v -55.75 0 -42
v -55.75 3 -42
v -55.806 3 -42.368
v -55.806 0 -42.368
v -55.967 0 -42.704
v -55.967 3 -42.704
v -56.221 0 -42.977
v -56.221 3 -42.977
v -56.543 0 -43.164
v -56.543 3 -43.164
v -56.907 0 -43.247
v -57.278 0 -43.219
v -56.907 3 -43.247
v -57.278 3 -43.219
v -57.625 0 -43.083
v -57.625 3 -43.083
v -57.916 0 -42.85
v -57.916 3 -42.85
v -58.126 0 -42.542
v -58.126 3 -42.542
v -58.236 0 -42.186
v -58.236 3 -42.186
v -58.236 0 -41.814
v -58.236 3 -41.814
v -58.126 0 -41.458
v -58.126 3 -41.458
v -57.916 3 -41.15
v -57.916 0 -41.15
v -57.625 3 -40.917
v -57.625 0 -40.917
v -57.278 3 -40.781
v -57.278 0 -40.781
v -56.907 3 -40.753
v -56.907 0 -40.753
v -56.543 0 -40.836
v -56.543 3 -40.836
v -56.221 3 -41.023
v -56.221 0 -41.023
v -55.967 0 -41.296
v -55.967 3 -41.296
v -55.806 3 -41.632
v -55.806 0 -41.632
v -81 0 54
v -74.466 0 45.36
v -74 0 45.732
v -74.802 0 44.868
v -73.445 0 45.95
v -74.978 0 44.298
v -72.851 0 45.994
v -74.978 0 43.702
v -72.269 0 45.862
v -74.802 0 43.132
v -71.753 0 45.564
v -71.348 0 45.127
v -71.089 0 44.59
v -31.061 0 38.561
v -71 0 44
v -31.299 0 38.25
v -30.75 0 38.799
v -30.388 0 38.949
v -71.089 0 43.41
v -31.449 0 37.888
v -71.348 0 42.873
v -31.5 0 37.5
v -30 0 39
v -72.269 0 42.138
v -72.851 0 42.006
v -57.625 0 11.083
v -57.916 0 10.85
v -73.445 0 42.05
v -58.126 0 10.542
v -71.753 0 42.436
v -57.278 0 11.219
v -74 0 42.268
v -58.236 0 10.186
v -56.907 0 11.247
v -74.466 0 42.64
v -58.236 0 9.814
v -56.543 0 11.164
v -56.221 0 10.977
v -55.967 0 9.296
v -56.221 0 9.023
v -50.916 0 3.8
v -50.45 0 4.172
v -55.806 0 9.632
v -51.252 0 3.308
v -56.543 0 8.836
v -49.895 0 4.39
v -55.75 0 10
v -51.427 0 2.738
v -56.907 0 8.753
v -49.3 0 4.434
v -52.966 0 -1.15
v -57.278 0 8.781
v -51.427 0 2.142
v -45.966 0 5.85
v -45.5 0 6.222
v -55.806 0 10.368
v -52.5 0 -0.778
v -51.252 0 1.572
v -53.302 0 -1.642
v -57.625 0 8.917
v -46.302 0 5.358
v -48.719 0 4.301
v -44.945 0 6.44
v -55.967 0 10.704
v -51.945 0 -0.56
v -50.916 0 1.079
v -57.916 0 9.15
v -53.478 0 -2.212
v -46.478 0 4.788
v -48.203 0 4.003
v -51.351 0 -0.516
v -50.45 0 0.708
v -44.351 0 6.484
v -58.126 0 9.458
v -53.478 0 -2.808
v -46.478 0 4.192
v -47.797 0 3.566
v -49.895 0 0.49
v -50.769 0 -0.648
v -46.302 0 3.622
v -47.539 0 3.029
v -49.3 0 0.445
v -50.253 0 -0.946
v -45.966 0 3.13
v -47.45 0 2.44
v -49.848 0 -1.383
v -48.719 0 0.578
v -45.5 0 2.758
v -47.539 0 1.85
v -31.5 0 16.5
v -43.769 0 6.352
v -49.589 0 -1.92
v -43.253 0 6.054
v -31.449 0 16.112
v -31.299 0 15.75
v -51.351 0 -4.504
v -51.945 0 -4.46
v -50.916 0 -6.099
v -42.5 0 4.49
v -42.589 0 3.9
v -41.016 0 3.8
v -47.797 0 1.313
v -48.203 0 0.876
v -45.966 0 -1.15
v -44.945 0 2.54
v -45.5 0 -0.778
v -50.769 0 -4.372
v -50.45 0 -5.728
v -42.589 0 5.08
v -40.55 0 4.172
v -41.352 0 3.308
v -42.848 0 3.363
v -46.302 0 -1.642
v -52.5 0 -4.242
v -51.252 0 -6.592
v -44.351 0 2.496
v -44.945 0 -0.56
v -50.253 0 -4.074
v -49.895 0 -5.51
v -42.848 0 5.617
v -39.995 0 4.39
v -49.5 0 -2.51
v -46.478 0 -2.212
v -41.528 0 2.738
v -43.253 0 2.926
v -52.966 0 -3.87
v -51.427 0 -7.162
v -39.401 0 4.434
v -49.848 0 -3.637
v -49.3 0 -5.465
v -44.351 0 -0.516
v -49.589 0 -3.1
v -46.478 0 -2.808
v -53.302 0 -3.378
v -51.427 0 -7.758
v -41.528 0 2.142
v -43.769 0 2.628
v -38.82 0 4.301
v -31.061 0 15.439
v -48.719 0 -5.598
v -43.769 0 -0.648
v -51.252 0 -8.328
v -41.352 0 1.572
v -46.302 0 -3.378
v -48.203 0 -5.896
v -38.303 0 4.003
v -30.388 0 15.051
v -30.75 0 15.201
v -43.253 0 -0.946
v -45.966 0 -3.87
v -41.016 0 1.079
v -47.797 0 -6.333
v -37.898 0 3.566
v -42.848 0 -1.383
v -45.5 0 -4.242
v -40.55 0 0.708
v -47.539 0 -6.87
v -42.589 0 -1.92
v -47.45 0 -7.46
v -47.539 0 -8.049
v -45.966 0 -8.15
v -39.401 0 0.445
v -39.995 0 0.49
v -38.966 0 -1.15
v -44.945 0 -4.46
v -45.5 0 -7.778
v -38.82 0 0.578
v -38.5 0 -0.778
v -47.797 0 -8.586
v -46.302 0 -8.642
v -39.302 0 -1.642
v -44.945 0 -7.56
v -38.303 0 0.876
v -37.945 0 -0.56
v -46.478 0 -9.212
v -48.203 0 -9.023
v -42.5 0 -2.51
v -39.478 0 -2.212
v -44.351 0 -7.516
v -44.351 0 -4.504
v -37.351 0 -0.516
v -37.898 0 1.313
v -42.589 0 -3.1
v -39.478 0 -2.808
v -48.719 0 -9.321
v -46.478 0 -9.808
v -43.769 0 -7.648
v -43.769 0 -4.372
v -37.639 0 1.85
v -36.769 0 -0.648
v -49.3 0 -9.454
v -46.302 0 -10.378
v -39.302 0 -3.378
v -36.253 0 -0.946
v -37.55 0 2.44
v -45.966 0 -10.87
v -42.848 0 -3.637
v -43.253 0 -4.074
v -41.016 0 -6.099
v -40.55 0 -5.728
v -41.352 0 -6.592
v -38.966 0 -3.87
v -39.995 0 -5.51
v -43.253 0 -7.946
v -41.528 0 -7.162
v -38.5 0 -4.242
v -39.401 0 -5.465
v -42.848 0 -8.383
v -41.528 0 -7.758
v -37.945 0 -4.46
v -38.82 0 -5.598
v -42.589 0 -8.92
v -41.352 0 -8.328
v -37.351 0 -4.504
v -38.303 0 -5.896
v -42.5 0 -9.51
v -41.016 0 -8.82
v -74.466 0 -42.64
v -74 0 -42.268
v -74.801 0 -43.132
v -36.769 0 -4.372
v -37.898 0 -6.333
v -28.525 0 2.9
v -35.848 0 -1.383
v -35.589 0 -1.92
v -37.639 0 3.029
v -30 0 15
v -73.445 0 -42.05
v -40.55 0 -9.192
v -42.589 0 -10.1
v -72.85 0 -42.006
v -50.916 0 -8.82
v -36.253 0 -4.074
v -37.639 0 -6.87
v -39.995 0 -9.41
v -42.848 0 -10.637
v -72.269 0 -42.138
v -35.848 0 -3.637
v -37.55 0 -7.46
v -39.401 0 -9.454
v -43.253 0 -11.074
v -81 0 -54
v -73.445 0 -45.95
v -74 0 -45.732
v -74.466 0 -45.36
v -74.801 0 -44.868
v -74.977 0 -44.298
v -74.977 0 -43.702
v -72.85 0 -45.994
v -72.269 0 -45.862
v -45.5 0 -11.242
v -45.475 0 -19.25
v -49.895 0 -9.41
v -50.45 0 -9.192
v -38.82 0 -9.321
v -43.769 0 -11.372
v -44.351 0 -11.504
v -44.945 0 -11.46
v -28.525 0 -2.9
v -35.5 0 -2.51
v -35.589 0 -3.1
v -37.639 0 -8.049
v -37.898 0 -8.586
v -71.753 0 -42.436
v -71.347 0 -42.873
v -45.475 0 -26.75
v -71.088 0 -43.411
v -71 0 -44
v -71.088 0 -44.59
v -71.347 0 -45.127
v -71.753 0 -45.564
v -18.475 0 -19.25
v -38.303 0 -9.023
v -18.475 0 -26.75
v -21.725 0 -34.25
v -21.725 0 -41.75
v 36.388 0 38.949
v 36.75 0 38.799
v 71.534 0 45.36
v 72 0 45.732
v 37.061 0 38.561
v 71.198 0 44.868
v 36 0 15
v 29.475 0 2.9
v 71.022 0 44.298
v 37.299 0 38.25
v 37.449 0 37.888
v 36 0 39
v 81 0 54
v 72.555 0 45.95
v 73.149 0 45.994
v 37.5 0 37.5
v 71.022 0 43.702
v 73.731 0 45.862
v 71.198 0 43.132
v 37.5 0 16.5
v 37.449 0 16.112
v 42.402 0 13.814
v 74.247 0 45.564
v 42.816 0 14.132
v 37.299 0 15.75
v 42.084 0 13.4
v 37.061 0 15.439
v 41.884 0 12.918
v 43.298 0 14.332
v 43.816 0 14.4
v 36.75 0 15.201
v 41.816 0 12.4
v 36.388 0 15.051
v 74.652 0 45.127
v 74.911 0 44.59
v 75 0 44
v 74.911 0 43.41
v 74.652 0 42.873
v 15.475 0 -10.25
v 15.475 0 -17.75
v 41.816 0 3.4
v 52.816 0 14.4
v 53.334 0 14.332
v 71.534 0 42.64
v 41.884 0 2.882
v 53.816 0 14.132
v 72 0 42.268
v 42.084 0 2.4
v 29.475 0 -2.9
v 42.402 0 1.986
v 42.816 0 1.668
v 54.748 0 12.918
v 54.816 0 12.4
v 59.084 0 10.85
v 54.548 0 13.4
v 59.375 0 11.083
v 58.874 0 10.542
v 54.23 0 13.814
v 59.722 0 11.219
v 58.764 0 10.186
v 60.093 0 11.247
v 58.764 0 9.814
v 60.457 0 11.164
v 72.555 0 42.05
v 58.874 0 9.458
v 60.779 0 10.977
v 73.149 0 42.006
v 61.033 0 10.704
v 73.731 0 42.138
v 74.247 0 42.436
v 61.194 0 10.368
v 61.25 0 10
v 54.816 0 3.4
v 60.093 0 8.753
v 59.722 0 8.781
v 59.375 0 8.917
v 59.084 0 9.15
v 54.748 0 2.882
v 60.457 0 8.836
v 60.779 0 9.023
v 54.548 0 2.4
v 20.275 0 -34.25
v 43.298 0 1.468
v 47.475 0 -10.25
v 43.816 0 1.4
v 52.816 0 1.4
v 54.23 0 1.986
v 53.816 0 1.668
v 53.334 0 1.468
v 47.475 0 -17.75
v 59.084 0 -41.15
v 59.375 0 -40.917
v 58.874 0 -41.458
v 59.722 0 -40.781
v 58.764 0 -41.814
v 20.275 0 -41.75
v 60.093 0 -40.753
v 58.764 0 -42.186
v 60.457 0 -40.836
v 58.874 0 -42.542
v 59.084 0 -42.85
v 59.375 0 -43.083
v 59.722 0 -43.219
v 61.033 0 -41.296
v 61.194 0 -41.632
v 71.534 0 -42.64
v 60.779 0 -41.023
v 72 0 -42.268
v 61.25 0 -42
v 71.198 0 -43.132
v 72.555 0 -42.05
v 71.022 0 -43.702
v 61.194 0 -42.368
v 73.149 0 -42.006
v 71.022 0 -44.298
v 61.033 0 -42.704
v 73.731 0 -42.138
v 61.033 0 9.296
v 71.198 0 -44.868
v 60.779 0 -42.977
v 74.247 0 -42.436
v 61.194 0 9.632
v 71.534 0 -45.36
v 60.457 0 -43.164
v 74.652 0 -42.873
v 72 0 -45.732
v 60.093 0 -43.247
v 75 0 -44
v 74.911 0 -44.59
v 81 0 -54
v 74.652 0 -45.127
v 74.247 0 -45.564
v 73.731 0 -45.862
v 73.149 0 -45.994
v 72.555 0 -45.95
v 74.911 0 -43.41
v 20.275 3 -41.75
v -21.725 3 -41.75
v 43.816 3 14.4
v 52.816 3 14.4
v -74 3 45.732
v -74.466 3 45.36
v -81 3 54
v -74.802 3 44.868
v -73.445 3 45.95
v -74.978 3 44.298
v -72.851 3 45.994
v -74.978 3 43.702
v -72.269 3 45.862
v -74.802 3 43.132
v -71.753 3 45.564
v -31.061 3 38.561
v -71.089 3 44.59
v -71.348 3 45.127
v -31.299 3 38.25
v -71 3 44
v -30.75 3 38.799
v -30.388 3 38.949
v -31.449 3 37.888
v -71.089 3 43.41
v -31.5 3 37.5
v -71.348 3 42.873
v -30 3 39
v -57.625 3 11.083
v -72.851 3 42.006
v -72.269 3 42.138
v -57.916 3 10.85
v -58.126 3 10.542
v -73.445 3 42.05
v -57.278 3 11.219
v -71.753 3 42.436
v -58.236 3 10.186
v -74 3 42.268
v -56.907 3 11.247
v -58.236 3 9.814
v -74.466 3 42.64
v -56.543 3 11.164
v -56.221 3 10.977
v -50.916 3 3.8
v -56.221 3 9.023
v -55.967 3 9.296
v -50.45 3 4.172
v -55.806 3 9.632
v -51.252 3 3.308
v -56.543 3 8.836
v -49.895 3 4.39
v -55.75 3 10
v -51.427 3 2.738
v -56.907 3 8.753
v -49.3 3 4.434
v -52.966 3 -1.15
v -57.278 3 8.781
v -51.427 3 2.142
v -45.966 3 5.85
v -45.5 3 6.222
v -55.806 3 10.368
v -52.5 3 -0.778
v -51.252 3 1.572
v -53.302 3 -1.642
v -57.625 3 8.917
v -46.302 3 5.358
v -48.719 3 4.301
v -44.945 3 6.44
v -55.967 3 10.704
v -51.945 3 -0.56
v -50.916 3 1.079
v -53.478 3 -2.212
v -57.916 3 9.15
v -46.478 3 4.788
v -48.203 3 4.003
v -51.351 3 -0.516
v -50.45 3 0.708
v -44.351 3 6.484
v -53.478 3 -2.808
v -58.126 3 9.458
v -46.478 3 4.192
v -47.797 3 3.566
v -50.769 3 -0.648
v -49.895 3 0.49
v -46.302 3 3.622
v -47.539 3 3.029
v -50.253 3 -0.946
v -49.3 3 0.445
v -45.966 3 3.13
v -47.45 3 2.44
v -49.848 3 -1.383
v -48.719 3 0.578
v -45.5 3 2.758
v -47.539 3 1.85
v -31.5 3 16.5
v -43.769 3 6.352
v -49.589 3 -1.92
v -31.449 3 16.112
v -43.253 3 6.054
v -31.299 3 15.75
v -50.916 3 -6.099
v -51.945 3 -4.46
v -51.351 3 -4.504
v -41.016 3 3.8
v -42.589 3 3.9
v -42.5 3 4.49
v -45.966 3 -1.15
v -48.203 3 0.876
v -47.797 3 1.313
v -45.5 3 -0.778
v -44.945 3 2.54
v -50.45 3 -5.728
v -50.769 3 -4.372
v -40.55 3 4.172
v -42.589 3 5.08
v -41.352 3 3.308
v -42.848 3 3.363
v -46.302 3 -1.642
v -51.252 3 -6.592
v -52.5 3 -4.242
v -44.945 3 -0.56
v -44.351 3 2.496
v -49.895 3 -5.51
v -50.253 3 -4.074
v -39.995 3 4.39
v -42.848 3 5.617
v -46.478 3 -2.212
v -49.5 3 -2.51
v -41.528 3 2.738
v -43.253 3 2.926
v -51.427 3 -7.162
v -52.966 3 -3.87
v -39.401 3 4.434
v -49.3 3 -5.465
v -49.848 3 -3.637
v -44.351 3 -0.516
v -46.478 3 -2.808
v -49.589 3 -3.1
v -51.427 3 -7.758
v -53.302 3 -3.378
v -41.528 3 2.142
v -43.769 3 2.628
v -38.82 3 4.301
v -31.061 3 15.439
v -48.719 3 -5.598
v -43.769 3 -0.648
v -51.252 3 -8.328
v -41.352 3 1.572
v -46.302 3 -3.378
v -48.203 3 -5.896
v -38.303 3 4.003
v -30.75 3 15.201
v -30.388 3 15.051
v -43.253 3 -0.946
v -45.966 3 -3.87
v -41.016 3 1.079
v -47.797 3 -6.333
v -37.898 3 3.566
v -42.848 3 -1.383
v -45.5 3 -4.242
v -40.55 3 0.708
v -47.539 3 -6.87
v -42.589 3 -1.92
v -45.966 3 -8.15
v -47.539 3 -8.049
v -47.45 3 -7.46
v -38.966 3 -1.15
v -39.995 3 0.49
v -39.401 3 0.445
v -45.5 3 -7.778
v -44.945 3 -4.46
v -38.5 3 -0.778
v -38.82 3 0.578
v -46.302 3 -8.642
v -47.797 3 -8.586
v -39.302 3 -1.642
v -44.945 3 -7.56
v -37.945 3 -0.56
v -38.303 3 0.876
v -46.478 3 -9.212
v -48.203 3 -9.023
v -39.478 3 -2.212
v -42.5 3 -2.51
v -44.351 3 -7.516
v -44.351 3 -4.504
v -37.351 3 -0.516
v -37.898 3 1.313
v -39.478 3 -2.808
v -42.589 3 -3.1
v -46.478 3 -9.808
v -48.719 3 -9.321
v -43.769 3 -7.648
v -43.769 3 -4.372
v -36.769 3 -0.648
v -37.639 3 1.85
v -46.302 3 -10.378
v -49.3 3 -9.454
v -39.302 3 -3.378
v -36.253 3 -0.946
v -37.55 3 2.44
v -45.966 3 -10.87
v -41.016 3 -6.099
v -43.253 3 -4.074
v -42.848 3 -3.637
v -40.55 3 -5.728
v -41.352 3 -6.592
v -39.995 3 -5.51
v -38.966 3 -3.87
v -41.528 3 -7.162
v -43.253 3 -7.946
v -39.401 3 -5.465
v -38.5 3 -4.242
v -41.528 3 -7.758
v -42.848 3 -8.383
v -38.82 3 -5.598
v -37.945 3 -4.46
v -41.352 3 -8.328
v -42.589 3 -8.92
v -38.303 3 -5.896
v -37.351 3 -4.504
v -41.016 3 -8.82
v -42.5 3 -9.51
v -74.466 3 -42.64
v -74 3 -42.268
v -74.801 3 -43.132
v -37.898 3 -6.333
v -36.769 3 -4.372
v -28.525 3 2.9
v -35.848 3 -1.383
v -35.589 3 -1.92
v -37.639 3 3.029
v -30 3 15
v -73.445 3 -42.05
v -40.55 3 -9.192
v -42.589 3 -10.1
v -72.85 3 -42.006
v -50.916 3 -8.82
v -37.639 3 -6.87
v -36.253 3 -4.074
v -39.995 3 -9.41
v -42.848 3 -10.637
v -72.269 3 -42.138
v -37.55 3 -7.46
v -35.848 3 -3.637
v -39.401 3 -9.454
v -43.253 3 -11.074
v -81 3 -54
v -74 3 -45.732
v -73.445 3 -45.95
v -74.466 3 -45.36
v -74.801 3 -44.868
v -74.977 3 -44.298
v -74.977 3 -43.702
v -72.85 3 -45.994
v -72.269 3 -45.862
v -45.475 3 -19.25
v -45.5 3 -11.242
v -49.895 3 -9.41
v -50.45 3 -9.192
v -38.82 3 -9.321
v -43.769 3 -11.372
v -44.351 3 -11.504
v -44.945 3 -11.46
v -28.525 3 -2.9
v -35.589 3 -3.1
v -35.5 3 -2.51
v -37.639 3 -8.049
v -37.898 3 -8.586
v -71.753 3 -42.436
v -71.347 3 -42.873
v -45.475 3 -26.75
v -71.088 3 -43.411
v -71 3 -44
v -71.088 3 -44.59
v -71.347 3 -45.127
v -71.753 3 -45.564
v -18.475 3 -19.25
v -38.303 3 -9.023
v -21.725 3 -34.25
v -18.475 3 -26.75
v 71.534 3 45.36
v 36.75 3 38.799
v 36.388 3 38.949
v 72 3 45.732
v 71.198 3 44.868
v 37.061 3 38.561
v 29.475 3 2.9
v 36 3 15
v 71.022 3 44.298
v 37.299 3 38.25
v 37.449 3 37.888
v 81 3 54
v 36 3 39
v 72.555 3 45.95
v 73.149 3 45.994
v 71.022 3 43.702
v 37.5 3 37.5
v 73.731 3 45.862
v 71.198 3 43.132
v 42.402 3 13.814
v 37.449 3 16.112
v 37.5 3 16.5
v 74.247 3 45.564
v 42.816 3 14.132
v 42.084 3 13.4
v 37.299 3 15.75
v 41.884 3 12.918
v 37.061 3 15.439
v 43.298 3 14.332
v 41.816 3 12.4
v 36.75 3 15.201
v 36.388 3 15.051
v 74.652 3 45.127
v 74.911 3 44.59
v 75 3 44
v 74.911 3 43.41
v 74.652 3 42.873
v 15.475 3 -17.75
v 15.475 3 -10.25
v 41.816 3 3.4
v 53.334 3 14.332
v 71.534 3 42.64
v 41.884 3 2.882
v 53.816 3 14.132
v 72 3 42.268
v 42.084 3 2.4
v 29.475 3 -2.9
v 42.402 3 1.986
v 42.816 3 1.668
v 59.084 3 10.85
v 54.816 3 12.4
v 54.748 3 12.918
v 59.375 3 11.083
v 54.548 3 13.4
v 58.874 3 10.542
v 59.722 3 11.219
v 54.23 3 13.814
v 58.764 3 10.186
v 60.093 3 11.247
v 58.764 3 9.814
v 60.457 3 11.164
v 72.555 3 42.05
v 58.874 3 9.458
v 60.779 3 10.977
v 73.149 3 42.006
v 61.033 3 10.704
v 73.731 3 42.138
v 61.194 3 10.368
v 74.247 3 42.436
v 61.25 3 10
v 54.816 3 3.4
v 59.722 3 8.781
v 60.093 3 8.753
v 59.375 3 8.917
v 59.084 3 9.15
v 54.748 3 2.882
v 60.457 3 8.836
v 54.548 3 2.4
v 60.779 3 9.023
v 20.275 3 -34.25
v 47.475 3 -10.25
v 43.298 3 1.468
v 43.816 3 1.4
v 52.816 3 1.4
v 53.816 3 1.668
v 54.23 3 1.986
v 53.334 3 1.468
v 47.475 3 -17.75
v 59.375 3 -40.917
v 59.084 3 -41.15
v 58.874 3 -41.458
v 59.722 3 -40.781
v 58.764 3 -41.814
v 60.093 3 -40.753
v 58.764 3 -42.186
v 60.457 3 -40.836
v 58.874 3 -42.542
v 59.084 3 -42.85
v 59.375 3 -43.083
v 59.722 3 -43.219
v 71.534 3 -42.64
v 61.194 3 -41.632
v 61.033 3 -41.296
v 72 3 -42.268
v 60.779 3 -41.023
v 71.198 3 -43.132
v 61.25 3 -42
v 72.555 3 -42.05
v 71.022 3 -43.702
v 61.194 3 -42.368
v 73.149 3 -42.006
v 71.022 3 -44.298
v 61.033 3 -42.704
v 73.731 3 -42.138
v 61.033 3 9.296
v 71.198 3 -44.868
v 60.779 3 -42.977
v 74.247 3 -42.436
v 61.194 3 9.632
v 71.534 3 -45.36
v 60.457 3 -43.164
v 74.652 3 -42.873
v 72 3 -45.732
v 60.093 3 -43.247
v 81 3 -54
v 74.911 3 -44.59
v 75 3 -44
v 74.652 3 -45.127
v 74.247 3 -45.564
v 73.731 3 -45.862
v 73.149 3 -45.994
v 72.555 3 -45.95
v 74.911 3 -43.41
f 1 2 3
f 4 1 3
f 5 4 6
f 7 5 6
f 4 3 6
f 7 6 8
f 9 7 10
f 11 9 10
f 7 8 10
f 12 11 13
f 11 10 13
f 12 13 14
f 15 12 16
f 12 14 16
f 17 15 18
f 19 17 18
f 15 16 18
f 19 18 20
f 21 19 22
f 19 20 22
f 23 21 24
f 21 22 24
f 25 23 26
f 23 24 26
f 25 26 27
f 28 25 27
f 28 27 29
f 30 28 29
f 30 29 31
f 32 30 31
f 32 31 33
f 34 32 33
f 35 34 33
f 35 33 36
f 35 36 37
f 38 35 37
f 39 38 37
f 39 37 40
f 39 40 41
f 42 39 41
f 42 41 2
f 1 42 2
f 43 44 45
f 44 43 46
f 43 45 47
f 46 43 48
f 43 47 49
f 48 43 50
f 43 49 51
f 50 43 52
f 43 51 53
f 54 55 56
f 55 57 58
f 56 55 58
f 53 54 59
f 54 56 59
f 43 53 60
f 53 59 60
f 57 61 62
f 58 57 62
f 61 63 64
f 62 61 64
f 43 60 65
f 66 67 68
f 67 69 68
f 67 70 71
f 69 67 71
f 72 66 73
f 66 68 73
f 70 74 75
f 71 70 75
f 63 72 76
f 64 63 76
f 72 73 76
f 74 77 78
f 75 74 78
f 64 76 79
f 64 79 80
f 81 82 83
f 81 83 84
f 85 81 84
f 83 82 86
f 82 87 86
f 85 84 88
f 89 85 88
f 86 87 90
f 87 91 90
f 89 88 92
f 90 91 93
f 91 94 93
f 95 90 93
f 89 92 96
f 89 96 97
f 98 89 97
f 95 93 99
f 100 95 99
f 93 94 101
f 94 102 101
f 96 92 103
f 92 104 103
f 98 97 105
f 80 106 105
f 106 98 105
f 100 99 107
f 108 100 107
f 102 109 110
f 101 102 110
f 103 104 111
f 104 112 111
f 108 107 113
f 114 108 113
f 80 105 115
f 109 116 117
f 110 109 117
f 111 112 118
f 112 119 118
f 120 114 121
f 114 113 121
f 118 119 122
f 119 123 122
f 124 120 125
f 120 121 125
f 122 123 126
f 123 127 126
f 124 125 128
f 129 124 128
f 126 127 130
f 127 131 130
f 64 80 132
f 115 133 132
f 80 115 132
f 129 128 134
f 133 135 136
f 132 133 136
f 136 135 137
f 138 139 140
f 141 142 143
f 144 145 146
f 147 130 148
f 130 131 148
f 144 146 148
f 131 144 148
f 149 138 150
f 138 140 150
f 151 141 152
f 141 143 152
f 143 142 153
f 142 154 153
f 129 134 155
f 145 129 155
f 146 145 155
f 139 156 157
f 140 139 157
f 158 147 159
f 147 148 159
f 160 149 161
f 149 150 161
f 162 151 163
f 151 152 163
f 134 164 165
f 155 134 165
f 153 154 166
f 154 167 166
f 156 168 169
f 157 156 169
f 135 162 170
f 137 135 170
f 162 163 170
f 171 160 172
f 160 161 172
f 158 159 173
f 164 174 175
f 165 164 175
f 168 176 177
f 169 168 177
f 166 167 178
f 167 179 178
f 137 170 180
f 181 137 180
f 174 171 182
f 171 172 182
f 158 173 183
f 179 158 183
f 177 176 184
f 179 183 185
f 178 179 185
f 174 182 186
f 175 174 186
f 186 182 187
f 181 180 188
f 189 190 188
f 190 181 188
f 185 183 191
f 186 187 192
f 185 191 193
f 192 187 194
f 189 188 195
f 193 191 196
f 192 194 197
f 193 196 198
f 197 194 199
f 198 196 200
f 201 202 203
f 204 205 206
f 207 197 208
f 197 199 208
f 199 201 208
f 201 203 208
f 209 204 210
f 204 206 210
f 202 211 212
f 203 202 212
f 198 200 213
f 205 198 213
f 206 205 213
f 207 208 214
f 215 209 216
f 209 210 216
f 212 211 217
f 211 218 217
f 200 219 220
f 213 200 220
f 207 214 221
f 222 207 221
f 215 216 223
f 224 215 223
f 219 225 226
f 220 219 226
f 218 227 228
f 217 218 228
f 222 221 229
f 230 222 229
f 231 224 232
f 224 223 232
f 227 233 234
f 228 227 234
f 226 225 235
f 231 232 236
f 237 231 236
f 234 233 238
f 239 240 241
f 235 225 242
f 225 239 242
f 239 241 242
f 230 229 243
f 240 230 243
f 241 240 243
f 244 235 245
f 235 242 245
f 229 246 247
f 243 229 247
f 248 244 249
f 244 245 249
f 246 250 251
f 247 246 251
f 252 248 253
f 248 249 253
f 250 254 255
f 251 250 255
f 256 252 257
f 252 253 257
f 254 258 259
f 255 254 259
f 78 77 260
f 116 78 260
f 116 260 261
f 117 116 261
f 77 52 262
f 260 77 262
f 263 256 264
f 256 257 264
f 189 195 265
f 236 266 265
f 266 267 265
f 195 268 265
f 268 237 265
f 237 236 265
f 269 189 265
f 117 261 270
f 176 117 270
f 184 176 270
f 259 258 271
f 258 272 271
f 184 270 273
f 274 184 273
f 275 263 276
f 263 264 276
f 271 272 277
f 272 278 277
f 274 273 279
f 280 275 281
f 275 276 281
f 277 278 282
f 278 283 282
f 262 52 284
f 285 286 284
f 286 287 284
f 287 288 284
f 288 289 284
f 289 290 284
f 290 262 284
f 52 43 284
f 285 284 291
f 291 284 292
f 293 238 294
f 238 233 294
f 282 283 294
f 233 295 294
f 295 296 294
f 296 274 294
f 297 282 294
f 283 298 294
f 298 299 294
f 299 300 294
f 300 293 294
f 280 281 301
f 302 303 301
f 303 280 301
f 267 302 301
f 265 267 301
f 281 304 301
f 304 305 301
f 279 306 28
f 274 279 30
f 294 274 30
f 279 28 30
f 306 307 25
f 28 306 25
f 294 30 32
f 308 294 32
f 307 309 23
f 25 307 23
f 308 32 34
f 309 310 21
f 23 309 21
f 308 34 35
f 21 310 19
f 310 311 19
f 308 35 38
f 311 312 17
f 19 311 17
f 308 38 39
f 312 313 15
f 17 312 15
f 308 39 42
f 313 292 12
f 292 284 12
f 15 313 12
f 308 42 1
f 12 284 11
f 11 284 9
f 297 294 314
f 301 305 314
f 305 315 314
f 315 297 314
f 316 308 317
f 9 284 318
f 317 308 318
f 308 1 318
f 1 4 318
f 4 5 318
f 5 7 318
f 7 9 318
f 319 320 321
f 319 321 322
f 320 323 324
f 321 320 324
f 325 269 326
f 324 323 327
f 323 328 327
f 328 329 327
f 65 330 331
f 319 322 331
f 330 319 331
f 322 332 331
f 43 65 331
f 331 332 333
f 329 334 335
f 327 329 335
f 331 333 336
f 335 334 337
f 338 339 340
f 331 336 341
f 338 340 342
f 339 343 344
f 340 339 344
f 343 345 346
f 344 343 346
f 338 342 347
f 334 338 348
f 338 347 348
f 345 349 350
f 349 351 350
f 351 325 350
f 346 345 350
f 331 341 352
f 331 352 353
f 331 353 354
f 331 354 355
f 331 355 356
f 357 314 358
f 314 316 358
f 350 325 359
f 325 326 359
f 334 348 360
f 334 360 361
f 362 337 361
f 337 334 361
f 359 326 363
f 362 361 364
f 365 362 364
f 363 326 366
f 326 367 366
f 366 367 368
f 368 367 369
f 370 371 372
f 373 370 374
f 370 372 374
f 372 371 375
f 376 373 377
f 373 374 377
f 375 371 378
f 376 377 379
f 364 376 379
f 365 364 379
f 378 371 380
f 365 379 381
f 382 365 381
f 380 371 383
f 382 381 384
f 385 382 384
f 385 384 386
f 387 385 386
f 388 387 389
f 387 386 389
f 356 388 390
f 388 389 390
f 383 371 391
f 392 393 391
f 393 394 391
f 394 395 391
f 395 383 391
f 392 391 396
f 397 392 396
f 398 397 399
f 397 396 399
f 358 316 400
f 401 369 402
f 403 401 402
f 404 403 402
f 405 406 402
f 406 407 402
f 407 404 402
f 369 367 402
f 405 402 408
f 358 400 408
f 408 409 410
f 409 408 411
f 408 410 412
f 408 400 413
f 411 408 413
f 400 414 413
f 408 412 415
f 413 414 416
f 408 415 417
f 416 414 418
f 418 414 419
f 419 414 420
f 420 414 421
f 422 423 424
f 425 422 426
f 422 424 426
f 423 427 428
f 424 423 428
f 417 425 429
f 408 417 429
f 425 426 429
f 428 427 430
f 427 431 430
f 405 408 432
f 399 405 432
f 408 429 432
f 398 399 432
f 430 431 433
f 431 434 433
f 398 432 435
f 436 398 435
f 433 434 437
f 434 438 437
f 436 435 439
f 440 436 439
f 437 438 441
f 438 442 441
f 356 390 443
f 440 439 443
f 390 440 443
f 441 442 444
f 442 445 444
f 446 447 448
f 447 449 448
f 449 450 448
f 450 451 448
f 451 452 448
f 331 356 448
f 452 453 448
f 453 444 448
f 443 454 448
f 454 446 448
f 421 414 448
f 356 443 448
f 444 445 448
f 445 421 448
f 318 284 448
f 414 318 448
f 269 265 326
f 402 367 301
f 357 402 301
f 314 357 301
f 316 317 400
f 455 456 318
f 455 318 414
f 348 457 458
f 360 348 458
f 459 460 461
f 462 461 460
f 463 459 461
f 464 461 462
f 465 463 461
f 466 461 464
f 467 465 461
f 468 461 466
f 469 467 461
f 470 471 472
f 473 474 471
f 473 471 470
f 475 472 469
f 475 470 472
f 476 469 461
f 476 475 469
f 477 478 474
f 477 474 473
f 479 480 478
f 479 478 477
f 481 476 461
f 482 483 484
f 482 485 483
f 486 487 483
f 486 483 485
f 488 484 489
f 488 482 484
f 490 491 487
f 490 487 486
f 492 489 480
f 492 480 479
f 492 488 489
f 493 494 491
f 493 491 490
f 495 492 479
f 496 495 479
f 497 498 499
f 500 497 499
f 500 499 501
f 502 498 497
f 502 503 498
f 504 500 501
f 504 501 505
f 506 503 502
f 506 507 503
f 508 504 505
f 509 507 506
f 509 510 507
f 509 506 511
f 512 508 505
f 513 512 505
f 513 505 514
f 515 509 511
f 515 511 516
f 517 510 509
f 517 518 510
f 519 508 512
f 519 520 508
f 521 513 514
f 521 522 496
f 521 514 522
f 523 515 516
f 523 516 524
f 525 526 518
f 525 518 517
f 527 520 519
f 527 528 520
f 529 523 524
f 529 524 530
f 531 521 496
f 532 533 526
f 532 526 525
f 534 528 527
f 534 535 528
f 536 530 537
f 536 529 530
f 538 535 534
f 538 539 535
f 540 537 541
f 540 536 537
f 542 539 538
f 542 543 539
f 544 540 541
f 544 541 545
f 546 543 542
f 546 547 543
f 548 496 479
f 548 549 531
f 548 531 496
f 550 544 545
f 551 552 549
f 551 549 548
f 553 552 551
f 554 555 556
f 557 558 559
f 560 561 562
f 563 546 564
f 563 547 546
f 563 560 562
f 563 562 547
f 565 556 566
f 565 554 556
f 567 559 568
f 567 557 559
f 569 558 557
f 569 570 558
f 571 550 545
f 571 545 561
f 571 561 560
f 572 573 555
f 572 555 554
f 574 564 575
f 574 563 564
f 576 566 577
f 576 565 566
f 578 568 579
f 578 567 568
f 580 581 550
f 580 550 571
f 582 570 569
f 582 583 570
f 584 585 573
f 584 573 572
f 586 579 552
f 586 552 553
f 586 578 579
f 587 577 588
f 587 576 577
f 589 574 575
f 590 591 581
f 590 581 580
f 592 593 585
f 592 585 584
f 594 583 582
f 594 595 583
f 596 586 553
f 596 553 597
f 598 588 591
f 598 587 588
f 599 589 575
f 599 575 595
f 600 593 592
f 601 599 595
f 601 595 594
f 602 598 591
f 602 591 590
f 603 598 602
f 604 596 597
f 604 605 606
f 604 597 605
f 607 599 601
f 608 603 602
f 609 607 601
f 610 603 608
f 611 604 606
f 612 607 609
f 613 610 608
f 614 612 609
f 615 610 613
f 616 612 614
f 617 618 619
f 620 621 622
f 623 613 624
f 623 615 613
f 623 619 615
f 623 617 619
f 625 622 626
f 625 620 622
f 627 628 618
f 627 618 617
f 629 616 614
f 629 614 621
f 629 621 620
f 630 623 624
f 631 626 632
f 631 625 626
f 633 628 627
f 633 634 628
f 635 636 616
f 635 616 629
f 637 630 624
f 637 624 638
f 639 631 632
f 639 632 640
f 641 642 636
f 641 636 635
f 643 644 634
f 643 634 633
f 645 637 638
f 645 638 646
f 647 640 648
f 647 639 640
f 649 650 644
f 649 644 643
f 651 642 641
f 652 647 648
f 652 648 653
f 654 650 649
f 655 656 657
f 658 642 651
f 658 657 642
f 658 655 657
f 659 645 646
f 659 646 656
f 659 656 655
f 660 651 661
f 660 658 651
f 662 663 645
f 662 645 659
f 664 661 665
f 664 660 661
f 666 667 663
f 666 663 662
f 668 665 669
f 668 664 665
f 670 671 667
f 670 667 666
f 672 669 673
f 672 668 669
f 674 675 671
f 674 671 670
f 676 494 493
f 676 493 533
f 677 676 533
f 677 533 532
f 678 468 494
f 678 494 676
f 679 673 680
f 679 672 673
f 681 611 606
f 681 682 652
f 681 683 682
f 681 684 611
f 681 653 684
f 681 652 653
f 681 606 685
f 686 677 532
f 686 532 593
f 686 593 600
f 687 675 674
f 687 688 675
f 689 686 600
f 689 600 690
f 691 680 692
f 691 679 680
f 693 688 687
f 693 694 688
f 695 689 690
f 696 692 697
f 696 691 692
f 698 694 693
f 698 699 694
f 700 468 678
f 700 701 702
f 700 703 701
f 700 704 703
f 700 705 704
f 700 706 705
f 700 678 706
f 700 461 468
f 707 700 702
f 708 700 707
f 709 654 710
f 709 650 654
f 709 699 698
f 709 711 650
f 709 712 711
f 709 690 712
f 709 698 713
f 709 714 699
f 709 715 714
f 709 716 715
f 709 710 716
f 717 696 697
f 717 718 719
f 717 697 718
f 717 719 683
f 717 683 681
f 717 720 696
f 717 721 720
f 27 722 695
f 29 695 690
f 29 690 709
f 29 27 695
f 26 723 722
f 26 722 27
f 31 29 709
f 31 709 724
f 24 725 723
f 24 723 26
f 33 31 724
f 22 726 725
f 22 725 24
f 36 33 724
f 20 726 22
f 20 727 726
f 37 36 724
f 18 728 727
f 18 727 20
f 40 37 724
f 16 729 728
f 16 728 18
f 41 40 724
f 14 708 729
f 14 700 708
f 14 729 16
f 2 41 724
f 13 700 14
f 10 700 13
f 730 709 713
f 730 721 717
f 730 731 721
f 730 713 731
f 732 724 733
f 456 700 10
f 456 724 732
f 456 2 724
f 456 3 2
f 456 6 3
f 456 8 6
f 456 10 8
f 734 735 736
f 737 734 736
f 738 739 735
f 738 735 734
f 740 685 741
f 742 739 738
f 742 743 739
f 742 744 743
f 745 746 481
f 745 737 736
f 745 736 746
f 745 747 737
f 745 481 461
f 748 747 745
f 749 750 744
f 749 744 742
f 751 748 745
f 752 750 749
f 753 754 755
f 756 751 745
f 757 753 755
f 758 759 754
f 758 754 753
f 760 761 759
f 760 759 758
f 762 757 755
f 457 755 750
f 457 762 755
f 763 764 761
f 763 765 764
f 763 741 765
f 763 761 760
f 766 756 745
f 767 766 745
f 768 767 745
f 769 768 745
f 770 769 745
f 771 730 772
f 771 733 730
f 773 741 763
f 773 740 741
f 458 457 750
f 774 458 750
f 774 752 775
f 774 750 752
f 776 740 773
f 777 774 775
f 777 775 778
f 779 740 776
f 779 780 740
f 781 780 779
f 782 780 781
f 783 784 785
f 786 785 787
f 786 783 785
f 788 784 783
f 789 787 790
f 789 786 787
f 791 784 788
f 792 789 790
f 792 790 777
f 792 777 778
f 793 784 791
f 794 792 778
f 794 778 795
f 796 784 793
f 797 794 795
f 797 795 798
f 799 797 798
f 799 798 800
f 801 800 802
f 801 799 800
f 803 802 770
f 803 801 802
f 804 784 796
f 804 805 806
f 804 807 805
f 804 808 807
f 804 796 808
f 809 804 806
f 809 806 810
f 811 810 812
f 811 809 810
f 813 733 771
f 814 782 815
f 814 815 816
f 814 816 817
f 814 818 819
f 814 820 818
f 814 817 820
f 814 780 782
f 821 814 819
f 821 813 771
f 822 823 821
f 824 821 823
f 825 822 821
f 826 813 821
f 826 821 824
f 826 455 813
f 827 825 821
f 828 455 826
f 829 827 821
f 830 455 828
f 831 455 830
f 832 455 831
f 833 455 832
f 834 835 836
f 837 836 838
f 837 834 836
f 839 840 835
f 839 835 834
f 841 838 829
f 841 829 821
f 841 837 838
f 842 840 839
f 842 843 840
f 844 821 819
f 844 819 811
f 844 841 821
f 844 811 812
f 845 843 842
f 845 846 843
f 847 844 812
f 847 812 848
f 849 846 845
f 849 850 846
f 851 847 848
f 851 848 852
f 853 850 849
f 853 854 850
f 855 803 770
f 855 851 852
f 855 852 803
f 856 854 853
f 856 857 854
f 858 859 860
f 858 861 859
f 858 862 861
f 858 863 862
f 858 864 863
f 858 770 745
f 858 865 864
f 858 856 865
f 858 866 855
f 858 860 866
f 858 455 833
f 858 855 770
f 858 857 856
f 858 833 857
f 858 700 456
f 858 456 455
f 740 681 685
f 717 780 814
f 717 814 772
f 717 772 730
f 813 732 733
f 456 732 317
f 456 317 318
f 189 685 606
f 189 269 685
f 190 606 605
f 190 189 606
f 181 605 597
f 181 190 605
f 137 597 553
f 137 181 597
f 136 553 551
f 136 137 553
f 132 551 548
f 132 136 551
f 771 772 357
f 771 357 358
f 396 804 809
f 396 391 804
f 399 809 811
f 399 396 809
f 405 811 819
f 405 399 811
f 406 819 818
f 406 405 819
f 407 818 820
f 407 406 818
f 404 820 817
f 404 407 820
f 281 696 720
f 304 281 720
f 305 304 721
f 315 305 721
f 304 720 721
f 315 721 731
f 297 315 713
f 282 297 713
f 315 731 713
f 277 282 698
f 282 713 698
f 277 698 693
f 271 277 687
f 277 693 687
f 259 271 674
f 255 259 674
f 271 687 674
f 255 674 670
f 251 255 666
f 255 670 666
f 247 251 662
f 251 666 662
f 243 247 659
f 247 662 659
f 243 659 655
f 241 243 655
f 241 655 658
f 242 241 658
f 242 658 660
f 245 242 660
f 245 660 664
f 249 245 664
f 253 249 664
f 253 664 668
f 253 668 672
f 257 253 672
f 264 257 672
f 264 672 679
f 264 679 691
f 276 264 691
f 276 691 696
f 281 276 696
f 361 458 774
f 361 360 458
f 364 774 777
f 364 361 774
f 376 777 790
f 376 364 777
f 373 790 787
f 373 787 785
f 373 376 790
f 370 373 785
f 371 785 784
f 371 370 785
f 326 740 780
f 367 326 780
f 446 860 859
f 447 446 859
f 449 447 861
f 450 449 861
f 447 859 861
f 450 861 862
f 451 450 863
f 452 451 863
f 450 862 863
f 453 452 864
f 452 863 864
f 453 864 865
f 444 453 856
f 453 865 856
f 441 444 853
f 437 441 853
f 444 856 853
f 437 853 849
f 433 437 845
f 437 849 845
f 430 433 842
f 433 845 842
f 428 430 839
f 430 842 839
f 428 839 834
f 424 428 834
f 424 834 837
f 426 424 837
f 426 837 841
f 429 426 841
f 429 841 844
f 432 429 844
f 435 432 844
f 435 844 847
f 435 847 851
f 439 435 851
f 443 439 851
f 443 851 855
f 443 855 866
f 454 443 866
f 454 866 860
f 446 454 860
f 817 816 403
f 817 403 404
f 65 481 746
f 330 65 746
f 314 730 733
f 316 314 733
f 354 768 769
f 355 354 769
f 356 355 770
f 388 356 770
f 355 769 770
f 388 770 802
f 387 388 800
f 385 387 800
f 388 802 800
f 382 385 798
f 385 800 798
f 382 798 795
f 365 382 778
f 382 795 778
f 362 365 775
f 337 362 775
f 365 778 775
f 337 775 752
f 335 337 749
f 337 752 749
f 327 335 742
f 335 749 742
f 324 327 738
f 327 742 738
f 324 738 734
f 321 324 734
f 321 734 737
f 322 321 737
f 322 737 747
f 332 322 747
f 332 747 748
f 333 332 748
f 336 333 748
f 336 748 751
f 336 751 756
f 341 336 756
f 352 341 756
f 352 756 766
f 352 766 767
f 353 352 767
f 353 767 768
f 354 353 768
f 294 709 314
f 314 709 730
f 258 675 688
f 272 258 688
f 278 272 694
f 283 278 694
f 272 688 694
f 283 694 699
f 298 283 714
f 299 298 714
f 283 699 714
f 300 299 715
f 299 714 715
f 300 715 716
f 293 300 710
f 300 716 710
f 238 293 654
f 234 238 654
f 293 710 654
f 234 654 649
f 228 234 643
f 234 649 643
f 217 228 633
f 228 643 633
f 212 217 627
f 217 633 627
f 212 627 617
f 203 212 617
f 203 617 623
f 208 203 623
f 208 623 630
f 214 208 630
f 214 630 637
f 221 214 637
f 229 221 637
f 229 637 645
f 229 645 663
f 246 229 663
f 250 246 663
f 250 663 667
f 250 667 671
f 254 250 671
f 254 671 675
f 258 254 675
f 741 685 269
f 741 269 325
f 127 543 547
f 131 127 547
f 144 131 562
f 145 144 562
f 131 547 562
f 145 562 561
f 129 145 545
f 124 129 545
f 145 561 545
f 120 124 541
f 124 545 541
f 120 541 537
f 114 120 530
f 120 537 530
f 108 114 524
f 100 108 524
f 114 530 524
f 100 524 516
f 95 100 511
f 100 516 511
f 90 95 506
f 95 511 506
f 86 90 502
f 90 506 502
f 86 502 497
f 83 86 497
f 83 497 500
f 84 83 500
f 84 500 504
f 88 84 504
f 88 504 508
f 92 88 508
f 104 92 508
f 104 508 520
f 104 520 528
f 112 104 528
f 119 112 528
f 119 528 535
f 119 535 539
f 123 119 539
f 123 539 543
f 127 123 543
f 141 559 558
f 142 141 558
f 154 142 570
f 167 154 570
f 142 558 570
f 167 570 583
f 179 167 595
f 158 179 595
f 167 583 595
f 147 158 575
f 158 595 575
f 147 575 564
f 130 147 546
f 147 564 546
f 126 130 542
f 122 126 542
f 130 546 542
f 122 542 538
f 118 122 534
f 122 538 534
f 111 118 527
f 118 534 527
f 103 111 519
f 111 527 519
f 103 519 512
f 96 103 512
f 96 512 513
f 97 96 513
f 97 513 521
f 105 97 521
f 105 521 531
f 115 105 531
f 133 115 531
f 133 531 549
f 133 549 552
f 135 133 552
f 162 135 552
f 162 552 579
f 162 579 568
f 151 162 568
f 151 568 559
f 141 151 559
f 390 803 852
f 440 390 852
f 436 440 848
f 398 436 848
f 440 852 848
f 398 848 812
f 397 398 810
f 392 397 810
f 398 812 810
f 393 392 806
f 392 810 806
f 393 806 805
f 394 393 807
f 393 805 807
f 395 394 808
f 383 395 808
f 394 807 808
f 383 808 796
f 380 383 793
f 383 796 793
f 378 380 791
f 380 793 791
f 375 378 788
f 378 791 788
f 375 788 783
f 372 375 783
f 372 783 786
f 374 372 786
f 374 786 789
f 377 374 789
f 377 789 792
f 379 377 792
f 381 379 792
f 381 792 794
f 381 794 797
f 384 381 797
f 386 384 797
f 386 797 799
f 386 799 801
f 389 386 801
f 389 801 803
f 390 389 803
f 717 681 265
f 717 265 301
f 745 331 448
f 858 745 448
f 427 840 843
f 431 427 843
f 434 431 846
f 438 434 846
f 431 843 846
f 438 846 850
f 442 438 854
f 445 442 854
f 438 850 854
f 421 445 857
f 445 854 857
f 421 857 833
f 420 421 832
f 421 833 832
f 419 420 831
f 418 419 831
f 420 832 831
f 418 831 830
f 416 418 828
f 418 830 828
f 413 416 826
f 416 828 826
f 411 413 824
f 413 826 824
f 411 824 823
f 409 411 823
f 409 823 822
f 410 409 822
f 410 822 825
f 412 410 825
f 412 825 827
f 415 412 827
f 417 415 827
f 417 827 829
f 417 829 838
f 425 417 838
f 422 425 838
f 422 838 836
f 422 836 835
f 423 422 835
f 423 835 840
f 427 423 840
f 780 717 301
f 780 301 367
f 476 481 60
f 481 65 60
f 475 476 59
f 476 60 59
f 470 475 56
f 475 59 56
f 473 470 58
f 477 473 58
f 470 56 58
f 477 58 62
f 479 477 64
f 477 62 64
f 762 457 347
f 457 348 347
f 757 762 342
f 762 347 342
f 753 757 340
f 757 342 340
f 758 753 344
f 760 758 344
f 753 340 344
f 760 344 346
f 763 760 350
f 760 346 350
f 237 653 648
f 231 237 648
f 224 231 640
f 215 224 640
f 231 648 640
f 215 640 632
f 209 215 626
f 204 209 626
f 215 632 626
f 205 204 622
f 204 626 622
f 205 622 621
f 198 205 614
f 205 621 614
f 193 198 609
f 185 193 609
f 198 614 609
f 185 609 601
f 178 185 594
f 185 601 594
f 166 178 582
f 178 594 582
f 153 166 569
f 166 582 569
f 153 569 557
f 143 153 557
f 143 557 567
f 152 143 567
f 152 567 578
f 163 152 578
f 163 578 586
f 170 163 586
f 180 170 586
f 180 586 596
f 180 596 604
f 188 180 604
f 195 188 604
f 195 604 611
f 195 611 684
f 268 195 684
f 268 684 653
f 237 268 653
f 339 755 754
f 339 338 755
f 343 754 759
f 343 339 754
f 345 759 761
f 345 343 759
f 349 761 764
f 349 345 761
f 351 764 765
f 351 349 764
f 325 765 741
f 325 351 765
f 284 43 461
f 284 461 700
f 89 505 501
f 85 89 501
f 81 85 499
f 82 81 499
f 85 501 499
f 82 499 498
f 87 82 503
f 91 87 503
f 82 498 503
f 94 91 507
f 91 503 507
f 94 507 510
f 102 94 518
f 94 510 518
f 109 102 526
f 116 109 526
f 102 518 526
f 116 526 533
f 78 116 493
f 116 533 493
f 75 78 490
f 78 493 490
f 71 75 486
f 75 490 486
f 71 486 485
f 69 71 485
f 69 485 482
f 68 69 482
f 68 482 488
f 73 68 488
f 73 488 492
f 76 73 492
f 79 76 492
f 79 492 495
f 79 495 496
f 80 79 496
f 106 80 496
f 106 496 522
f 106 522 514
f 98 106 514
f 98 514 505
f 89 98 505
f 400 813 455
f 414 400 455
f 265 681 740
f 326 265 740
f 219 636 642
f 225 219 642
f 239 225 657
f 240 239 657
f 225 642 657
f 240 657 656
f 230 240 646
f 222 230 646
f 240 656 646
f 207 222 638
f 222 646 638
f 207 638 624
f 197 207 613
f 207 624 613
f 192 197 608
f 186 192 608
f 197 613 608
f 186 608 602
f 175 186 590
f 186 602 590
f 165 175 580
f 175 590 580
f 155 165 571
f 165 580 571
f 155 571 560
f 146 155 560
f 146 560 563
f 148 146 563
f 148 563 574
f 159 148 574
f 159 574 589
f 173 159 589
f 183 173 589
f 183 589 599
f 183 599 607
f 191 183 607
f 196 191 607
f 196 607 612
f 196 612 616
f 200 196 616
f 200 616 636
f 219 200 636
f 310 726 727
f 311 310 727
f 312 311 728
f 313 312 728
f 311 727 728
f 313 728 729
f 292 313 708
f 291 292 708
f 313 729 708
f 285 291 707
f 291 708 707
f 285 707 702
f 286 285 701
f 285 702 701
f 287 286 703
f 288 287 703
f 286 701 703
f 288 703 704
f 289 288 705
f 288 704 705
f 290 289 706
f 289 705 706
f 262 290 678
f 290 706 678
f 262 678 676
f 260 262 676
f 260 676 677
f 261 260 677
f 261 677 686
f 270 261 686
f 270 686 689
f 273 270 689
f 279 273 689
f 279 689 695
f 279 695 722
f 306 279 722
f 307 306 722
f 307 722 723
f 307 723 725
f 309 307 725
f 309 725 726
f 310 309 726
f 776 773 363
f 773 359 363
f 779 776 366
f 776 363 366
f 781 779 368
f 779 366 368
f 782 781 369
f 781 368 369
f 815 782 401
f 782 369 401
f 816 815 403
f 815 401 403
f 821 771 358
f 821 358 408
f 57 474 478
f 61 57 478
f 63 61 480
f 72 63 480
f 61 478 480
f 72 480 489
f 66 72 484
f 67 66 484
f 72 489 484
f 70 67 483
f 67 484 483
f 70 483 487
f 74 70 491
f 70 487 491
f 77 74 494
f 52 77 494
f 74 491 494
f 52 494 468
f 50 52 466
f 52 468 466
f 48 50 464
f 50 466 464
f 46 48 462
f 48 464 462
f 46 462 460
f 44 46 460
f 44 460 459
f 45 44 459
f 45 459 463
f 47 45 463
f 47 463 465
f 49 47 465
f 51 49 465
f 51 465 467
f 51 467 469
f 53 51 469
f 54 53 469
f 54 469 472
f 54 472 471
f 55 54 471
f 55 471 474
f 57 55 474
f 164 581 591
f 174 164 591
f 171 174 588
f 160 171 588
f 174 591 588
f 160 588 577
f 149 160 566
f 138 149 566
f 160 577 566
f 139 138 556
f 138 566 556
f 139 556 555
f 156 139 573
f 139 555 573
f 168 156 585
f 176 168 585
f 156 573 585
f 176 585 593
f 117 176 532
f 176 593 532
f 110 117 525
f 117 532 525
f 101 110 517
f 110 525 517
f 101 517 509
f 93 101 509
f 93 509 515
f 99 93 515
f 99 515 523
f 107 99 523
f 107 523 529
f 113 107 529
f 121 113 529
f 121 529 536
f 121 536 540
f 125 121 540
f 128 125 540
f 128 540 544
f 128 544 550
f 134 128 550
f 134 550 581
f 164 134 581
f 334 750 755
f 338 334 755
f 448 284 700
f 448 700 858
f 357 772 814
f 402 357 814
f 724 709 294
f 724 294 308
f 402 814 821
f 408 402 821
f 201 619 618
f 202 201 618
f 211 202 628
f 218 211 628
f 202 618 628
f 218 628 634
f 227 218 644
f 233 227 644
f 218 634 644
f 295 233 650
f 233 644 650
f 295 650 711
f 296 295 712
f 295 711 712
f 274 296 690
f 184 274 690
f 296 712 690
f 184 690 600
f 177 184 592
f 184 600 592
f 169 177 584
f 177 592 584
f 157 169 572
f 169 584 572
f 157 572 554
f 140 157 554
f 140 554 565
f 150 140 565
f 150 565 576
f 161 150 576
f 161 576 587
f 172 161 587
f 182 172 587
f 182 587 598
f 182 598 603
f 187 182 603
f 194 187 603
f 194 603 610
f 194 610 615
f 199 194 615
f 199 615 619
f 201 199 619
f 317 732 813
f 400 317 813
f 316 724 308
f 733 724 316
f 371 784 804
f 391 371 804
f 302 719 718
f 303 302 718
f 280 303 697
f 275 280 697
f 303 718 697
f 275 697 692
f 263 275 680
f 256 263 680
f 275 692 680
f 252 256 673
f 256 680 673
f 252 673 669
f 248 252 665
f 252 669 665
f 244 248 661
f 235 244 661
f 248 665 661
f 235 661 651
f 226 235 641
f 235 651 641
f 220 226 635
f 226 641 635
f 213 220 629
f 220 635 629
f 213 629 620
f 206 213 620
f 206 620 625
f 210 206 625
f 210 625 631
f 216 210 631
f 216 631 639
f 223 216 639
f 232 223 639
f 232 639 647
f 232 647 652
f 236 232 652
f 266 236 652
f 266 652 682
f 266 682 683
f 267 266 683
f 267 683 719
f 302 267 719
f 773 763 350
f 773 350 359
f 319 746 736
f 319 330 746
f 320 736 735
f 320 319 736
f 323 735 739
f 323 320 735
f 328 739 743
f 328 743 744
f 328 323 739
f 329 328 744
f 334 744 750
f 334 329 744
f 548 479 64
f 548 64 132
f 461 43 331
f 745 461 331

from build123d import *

# Parameters (mm, degrees)
SKETCH_1_W             = 162
SKETCH_1_H             = 108
EXTRUDE_1_DEPTH        = 3
SKETCH_2_R             = 2
SKETCH_2_W             = 42
SKETCH_2_H             = 7.5
SKETCH_2_W_2           = 27
SKETCH_2_W_3           = 32
SKETCH_2_W_4           = 58
SKETCH_2_H_2           = 5.8
SKETCH_2_W_5           = 69
SKETCH_2_H_3           = 24
SKETCH_2_W_6           = 13
SKETCH_2_H_4           = 13
CUT_EXTRUDE_2448_DEPTH = 4
FILLET_1_R             = 1.5
SKETCH_3_R             = 1.25
CUT_EXTRUDE_3312_DEPTH = 4
SKETCH_4_R             = 2
CUT_EXTRUDE_4190_DEPTH = 4
FILLET_2_R             = 2


with BuildPart() as part:
    # Эскиз1 → Бобышка-Вытянуть1 (new body)
    with BuildSketch(Plane(origin=(0, 0, 0), x_dir=(1, 0, 0), z_dir=(0, 1, 0))):
        Rectangle(SKETCH_1_W, SKETCH_1_H)
    extrude(amount=EXTRUDE_1_DEPTH)

    # Эскиз2 → Cut-Extrude 2448 (cut, through all)
    with BuildSketch(Plane(origin=(0, 3, 0), x_dir=(1, 0, 0), z_dir=(0, 1, 0))):
        with Locations((-72.99950864, 44.00008818)):
            Circle(SKETCH_2_R)
        with Locations((73, 44)):
            Circle(SKETCH_2_R)
        with Locations((-73, -44)):
            Circle(SKETCH_2_R)
        with Locations((73, -44)):
            Circle(SKETCH_2_R)
        with Locations((-0.725, 38)):
            Rectangle(SKETCH_2_W, SKETCH_2_H)
        with Locations((-31.975, 23)):
            Rectangle(SKETCH_2_W_2, SKETCH_2_H)
        with Locations((31.475, 14)):
            Rectangle(SKETCH_2_W_3, SKETCH_2_H)
        with Locations((0.475, 0)):
            Rectangle(SKETCH_2_W_4, SKETCH_2_H_2)
        with Locations((3, -27)):
            Rectangle(SKETCH_2_W_5, SKETCH_2_H_3)
        with Locations((48.316, -7.9)):
            Rectangle(SKETCH_2_W_6, SKETCH_2_H_4)
    extrude(amount=-CUT_EXTRUDE_2448_DEPTH, mode=Mode.SUBTRACT)

    # Скругление1
    fillet_1_edges = [part.edges().sort_by_distance(p)[0] for p in [
        (-31.5, 1.5, 39),
        (-31.5, 1.5, 15),
        (37.5, 1.5, 15),
        (37.5, 1.5, 39),
    ]]
    fillet(fillet_1_edges, radius=FILLET_1_R)

    # Эскиз3 → Cut-Extrude 3312 (cut, through all)
    with BuildSketch(Plane(origin=(0, 3, 0), x_dir=(1, 0, 0), z_dir=(0, 1, 0))):
        with Locations((-57, 42)):
            Circle(SKETCH_3_R)
        with Locations((-57, -10)):
            Circle(SKETCH_3_R)
        with Locations((60, 42)):
            Circle(SKETCH_3_R)
        with Locations((60, -10)):
            Circle(SKETCH_3_R)
    extrude(amount=-CUT_EXTRUDE_3312_DEPTH, mode=Mode.SUBTRACT)

    # Эскиз4 → Cut-Extrude 4190 (cut, through all)
    with BuildSketch(Plane(origin=(0, 3, 0), x_dir=(1, 0, 0), z_dir=(0, 1, 0))):
        with Locations((-44.5, 2.51)):
            Circle(SKETCH_4_R)
        with Locations((-51.5, 2.51)):
            Circle(SKETCH_4_R)
        with Locations((-49.449747468, 7.459747468)):
            Circle(SKETCH_4_R)
        with Locations((-44.5, 9.51)):
            Circle(SKETCH_4_R)
        with Locations((-39.550252532, 7.459747468)):
            Circle(SKETCH_4_R)
        with Locations((-37.5, 2.51)):
            Circle(SKETCH_4_R)
        with Locations((-39.550252532, -2.439747468)):
            Circle(SKETCH_4_R)
        with Locations((-44.5, -4.49)):
            Circle(SKETCH_4_R)
        with Locations((-49.449747468, -2.439747468)):
            Circle(SKETCH_4_R)
    extrude(amount=-CUT_EXTRUDE_4190_DEPTH, mode=Mode.SUBTRACT)

    # Скругление2
    fillet_2_edges = [part.edges().sort_by_distance(p)[0] for p in [
        (41.816, 1.5, 14.4),
        (41.816, 1.5, 1.4),
        (54.816, 1.5, 1.4),
        (54.816, 1.5, 14.4),
    ]]
    fillet(fillet_2_edges, radius=FILLET_2_R)


solid = part.part
